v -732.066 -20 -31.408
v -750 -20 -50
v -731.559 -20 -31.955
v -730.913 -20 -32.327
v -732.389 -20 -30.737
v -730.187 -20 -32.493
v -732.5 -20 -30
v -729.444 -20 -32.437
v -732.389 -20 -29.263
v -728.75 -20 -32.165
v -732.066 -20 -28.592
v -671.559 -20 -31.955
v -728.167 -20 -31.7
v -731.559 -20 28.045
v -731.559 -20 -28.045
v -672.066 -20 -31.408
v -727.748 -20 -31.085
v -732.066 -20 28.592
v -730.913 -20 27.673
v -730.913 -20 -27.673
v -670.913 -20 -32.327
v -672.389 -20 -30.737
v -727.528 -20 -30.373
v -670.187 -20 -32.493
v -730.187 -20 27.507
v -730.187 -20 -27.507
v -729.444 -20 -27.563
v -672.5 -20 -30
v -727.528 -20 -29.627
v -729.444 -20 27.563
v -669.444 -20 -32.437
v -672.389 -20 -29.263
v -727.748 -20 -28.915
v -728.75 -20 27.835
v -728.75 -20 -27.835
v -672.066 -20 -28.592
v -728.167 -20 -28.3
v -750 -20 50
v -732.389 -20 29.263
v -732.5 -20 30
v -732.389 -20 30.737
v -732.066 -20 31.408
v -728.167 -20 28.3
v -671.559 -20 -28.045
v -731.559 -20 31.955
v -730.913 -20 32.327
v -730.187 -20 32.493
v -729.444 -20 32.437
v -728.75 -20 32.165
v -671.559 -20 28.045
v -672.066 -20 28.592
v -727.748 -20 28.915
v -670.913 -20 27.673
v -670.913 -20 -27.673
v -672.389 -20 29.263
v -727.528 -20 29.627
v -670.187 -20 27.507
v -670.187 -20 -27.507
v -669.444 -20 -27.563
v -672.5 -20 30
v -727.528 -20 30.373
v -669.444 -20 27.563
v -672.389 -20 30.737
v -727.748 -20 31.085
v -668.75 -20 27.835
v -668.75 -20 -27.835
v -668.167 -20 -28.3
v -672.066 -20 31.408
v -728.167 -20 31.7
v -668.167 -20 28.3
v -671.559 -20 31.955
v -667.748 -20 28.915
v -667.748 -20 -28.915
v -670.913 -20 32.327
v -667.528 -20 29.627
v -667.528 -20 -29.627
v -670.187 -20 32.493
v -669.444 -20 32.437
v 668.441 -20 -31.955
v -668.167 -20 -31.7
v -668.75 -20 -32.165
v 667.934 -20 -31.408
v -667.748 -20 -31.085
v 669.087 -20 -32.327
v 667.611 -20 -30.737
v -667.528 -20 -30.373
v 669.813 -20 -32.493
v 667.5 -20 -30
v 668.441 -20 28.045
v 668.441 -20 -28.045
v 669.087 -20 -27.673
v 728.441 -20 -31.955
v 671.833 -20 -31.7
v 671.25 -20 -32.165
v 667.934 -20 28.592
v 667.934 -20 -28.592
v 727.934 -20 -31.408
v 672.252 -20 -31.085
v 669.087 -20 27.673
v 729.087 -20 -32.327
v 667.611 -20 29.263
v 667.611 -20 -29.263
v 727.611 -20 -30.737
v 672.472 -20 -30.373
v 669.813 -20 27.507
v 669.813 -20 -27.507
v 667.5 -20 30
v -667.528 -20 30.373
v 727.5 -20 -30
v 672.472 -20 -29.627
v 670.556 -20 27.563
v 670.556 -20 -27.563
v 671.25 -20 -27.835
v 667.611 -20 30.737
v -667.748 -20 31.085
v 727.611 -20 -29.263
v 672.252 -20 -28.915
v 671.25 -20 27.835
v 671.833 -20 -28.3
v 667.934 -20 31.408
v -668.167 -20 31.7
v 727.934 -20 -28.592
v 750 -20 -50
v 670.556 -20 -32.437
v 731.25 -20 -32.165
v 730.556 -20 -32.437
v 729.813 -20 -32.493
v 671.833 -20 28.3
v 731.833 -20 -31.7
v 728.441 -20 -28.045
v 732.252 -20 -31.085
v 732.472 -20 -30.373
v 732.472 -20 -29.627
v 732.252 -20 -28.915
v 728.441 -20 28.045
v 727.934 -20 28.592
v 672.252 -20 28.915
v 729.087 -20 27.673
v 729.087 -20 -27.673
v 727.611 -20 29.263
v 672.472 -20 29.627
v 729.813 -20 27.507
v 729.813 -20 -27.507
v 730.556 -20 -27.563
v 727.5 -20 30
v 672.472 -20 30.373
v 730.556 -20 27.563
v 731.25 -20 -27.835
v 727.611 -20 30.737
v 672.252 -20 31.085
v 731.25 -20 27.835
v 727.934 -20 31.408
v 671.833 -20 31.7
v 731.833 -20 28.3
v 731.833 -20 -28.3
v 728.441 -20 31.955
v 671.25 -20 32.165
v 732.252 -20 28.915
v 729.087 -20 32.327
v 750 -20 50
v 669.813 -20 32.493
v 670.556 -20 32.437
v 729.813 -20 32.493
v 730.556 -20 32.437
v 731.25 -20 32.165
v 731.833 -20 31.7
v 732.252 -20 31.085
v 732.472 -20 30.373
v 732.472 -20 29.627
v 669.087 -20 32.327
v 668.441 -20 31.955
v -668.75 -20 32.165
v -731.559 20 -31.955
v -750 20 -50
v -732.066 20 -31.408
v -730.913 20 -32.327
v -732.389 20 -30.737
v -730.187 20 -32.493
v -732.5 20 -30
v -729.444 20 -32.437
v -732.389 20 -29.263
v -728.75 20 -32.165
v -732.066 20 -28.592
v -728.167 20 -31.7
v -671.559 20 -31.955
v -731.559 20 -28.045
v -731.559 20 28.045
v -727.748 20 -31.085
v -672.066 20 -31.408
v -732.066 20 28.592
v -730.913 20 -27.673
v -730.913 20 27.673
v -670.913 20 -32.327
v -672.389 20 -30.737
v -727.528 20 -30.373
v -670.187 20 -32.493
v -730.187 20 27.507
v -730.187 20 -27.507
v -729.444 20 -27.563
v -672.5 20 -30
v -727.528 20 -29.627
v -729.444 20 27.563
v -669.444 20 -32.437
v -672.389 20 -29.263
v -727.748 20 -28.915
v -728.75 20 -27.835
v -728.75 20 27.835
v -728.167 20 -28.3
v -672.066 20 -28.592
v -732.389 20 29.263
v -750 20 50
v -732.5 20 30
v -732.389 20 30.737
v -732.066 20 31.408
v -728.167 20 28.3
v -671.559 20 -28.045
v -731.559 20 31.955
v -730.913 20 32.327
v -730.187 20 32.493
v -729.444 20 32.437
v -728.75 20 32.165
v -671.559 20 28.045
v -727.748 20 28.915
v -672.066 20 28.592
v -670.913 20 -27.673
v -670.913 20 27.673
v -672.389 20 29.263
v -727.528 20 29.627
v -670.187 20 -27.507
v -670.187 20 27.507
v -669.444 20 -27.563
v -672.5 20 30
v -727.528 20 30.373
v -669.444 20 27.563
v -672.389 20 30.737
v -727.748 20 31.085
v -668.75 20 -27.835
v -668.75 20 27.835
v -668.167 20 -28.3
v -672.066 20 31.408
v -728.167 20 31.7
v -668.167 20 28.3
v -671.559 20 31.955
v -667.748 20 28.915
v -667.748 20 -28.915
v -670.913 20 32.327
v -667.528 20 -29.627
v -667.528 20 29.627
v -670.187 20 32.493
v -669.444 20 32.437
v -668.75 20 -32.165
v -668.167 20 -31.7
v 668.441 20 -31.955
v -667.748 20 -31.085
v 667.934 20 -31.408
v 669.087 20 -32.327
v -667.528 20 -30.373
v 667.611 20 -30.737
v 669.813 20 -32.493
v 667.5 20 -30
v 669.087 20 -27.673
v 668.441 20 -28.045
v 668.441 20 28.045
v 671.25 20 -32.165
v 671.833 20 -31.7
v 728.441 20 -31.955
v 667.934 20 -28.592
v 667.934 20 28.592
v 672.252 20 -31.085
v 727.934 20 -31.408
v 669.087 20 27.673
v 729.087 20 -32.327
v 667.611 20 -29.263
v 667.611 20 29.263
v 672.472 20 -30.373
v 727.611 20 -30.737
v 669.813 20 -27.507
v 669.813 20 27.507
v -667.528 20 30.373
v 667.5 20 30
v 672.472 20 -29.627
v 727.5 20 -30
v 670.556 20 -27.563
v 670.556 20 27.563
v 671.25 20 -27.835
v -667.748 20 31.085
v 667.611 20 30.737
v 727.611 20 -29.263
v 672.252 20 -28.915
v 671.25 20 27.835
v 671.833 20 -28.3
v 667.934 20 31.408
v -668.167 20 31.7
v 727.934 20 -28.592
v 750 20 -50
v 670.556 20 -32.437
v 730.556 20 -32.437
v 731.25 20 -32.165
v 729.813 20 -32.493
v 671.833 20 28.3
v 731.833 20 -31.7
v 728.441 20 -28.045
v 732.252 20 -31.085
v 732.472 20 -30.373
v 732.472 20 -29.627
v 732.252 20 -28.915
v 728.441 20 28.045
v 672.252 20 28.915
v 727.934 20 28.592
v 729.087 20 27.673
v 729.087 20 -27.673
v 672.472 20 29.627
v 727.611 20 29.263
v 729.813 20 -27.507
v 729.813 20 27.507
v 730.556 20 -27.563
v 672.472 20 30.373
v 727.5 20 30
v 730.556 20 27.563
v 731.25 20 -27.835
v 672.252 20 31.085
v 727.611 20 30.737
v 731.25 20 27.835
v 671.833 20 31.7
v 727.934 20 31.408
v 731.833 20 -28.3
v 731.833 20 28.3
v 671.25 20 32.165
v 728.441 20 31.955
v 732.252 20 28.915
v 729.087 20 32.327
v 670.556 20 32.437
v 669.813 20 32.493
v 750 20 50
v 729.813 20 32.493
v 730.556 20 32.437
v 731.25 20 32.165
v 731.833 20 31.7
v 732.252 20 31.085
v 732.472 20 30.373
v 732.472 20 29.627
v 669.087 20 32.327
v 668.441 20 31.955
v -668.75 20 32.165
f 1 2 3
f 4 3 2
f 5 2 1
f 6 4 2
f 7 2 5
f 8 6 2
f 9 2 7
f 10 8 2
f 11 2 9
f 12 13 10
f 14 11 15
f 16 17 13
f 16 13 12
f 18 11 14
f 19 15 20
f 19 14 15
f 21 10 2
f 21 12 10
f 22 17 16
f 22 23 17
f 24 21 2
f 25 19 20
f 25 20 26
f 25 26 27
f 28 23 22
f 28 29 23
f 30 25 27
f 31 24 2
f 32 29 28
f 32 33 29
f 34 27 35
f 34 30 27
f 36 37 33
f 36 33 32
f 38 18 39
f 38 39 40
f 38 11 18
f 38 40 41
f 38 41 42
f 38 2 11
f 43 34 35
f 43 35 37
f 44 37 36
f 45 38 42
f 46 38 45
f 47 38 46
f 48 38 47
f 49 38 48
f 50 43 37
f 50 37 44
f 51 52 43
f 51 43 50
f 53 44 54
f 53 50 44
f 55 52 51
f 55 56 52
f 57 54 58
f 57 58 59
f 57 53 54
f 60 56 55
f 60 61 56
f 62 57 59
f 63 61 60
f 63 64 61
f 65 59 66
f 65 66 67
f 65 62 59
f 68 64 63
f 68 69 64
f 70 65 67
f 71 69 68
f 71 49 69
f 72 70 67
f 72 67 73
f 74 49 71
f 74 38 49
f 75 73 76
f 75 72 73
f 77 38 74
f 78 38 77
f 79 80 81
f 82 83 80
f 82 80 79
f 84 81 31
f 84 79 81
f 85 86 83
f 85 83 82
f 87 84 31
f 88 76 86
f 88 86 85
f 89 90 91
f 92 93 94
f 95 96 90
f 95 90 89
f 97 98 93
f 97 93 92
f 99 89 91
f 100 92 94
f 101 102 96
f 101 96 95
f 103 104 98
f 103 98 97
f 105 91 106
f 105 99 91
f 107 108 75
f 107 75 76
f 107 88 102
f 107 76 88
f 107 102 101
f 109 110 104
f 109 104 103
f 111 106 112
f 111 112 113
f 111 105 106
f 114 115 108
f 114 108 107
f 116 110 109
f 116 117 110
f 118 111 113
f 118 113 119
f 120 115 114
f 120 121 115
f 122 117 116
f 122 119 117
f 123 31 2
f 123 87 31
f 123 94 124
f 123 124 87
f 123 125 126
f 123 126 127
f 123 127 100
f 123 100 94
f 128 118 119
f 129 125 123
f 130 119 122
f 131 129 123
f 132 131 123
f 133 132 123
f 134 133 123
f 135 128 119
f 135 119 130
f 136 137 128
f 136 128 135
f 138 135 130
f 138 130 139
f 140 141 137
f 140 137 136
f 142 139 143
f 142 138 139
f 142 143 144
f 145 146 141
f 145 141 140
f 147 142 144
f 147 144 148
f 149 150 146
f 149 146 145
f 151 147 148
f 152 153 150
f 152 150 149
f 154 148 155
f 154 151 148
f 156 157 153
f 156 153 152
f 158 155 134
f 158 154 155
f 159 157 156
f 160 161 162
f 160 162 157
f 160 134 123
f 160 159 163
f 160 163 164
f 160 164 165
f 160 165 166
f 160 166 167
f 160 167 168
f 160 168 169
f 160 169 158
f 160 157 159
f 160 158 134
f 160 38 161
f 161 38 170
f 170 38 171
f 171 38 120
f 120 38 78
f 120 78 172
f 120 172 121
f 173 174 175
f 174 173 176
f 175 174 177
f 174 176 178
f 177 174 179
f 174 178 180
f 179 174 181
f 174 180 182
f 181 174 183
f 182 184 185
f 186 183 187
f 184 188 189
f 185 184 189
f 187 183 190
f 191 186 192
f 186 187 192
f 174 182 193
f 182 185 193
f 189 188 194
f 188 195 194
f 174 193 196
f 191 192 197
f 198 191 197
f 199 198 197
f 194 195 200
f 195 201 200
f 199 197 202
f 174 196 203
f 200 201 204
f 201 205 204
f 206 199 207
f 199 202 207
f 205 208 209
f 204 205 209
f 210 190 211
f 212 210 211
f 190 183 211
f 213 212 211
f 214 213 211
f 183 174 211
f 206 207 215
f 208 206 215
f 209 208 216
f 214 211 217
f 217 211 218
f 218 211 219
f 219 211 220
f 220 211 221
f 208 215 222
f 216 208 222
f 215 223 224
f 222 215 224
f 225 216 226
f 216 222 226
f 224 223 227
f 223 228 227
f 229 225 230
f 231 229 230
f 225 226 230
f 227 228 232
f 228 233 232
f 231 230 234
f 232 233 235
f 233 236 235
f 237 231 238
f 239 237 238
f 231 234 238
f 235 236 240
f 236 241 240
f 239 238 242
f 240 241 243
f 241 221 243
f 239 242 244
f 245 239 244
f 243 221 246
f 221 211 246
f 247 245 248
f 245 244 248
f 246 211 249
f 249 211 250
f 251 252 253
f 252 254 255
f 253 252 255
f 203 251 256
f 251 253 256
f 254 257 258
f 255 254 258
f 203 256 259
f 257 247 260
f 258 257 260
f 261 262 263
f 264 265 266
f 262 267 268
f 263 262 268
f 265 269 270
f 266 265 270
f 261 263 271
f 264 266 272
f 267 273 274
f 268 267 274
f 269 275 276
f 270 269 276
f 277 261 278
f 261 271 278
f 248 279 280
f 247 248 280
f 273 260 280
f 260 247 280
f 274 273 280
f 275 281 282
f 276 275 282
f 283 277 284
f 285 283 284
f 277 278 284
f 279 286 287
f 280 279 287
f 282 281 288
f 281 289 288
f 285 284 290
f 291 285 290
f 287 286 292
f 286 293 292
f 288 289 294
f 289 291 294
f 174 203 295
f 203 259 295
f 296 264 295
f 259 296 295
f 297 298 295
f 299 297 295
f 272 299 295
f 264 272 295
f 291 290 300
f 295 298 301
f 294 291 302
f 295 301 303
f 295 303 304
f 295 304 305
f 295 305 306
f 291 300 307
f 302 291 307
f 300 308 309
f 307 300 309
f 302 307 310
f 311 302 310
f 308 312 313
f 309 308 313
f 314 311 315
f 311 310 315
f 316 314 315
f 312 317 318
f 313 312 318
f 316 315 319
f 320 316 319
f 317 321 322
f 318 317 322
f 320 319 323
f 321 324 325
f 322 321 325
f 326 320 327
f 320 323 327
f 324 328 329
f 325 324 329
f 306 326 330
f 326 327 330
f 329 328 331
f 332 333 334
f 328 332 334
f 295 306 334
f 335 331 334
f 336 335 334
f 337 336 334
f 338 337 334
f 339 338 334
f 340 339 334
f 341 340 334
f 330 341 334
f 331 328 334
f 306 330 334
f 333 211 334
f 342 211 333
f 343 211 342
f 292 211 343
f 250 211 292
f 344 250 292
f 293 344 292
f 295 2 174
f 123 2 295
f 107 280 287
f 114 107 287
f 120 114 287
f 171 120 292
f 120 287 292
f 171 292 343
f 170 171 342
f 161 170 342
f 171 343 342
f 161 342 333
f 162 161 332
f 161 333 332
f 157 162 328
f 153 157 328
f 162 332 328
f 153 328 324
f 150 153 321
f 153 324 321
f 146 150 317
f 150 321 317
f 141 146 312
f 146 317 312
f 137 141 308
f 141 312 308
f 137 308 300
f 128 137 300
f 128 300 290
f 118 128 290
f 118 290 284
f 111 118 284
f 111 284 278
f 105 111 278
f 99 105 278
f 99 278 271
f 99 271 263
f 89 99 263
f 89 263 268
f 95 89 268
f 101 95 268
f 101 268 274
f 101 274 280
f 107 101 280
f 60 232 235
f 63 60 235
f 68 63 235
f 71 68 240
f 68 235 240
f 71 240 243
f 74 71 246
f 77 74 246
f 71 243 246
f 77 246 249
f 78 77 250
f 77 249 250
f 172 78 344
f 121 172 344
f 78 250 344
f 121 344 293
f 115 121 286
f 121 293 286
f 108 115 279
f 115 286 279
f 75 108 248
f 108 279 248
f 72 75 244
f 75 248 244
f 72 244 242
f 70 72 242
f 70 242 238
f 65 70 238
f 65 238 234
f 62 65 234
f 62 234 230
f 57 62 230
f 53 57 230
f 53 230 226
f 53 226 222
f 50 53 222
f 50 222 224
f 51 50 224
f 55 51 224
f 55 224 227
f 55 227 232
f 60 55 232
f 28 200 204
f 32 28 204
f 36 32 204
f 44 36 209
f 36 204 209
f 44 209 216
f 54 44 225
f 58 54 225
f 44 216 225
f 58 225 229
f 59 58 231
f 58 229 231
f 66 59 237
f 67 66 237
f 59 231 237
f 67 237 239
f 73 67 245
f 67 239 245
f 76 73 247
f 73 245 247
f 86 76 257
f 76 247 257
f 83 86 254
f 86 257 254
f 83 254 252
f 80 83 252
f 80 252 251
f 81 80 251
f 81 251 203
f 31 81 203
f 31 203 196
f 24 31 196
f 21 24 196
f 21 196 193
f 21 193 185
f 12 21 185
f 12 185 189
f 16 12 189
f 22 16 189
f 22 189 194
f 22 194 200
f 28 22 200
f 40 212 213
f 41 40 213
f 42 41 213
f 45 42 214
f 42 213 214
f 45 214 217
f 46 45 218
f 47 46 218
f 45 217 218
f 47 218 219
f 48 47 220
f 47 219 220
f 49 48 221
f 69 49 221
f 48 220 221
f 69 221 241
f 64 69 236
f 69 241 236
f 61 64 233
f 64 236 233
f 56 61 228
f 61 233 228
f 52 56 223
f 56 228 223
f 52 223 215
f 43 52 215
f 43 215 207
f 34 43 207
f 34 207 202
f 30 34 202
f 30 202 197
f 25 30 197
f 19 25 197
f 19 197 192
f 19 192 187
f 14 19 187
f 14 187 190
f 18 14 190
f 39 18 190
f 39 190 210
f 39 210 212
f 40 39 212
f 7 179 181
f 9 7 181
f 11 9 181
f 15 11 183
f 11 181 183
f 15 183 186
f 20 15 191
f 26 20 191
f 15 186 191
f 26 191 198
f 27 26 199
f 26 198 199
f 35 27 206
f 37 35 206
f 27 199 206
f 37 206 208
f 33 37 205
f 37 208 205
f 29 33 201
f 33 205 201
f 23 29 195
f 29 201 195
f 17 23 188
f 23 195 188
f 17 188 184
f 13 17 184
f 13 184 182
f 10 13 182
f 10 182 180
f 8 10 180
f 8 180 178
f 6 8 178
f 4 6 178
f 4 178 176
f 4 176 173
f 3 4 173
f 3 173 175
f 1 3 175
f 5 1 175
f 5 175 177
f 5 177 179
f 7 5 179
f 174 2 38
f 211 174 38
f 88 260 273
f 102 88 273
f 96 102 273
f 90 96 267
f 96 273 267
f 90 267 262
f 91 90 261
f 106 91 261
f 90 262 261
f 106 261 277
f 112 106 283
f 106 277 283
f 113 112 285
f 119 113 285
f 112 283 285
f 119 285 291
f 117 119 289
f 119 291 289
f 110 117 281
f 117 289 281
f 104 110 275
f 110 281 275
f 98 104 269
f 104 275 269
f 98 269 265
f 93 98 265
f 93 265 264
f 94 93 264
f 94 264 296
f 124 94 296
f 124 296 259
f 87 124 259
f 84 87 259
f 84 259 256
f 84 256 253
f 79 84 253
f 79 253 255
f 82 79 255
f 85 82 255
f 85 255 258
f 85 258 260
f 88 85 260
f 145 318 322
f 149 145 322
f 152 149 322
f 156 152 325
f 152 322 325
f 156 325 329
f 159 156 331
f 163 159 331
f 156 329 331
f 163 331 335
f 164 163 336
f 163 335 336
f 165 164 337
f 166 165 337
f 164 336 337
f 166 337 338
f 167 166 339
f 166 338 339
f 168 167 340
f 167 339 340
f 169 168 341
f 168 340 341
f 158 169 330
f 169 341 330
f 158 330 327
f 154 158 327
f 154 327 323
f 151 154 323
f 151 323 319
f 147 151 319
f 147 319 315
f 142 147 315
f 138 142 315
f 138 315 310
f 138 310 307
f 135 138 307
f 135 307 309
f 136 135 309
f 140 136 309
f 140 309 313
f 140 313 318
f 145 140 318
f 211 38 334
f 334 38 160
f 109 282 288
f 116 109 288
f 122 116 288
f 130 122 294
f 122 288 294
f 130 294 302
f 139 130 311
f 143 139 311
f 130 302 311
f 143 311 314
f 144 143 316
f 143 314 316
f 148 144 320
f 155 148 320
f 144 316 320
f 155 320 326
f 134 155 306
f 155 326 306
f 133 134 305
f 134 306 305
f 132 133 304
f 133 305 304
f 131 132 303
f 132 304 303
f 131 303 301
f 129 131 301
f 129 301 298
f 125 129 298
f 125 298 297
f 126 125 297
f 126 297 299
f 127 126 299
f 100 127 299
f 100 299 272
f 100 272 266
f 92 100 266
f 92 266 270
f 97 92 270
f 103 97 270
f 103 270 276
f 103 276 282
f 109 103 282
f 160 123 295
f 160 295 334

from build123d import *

# Parameters (mm, degrees)
F0_W     = 1500
F0_H     = 100
F1_DEPTH = 20
F3_D     = 5


with BuildPart() as f1:
    # F0 (on Front) → F1 (new body, symmetric)
    with BuildSketch(Plane.XZ):
        Rectangle(F0_W, F0_H)
    extrude(amount=F1_DEPTH, both=True)

    # F3 (through all)
    with Locations(Plane.XZ.offset(20)):
        with Locations((-730, 30), (-730, -30), (-670, 30), (-670, -30), (670, 30), (730, 30), (670, -30), (730, -30)):
            Hole(F3_D / 2)


solid = f1.part
